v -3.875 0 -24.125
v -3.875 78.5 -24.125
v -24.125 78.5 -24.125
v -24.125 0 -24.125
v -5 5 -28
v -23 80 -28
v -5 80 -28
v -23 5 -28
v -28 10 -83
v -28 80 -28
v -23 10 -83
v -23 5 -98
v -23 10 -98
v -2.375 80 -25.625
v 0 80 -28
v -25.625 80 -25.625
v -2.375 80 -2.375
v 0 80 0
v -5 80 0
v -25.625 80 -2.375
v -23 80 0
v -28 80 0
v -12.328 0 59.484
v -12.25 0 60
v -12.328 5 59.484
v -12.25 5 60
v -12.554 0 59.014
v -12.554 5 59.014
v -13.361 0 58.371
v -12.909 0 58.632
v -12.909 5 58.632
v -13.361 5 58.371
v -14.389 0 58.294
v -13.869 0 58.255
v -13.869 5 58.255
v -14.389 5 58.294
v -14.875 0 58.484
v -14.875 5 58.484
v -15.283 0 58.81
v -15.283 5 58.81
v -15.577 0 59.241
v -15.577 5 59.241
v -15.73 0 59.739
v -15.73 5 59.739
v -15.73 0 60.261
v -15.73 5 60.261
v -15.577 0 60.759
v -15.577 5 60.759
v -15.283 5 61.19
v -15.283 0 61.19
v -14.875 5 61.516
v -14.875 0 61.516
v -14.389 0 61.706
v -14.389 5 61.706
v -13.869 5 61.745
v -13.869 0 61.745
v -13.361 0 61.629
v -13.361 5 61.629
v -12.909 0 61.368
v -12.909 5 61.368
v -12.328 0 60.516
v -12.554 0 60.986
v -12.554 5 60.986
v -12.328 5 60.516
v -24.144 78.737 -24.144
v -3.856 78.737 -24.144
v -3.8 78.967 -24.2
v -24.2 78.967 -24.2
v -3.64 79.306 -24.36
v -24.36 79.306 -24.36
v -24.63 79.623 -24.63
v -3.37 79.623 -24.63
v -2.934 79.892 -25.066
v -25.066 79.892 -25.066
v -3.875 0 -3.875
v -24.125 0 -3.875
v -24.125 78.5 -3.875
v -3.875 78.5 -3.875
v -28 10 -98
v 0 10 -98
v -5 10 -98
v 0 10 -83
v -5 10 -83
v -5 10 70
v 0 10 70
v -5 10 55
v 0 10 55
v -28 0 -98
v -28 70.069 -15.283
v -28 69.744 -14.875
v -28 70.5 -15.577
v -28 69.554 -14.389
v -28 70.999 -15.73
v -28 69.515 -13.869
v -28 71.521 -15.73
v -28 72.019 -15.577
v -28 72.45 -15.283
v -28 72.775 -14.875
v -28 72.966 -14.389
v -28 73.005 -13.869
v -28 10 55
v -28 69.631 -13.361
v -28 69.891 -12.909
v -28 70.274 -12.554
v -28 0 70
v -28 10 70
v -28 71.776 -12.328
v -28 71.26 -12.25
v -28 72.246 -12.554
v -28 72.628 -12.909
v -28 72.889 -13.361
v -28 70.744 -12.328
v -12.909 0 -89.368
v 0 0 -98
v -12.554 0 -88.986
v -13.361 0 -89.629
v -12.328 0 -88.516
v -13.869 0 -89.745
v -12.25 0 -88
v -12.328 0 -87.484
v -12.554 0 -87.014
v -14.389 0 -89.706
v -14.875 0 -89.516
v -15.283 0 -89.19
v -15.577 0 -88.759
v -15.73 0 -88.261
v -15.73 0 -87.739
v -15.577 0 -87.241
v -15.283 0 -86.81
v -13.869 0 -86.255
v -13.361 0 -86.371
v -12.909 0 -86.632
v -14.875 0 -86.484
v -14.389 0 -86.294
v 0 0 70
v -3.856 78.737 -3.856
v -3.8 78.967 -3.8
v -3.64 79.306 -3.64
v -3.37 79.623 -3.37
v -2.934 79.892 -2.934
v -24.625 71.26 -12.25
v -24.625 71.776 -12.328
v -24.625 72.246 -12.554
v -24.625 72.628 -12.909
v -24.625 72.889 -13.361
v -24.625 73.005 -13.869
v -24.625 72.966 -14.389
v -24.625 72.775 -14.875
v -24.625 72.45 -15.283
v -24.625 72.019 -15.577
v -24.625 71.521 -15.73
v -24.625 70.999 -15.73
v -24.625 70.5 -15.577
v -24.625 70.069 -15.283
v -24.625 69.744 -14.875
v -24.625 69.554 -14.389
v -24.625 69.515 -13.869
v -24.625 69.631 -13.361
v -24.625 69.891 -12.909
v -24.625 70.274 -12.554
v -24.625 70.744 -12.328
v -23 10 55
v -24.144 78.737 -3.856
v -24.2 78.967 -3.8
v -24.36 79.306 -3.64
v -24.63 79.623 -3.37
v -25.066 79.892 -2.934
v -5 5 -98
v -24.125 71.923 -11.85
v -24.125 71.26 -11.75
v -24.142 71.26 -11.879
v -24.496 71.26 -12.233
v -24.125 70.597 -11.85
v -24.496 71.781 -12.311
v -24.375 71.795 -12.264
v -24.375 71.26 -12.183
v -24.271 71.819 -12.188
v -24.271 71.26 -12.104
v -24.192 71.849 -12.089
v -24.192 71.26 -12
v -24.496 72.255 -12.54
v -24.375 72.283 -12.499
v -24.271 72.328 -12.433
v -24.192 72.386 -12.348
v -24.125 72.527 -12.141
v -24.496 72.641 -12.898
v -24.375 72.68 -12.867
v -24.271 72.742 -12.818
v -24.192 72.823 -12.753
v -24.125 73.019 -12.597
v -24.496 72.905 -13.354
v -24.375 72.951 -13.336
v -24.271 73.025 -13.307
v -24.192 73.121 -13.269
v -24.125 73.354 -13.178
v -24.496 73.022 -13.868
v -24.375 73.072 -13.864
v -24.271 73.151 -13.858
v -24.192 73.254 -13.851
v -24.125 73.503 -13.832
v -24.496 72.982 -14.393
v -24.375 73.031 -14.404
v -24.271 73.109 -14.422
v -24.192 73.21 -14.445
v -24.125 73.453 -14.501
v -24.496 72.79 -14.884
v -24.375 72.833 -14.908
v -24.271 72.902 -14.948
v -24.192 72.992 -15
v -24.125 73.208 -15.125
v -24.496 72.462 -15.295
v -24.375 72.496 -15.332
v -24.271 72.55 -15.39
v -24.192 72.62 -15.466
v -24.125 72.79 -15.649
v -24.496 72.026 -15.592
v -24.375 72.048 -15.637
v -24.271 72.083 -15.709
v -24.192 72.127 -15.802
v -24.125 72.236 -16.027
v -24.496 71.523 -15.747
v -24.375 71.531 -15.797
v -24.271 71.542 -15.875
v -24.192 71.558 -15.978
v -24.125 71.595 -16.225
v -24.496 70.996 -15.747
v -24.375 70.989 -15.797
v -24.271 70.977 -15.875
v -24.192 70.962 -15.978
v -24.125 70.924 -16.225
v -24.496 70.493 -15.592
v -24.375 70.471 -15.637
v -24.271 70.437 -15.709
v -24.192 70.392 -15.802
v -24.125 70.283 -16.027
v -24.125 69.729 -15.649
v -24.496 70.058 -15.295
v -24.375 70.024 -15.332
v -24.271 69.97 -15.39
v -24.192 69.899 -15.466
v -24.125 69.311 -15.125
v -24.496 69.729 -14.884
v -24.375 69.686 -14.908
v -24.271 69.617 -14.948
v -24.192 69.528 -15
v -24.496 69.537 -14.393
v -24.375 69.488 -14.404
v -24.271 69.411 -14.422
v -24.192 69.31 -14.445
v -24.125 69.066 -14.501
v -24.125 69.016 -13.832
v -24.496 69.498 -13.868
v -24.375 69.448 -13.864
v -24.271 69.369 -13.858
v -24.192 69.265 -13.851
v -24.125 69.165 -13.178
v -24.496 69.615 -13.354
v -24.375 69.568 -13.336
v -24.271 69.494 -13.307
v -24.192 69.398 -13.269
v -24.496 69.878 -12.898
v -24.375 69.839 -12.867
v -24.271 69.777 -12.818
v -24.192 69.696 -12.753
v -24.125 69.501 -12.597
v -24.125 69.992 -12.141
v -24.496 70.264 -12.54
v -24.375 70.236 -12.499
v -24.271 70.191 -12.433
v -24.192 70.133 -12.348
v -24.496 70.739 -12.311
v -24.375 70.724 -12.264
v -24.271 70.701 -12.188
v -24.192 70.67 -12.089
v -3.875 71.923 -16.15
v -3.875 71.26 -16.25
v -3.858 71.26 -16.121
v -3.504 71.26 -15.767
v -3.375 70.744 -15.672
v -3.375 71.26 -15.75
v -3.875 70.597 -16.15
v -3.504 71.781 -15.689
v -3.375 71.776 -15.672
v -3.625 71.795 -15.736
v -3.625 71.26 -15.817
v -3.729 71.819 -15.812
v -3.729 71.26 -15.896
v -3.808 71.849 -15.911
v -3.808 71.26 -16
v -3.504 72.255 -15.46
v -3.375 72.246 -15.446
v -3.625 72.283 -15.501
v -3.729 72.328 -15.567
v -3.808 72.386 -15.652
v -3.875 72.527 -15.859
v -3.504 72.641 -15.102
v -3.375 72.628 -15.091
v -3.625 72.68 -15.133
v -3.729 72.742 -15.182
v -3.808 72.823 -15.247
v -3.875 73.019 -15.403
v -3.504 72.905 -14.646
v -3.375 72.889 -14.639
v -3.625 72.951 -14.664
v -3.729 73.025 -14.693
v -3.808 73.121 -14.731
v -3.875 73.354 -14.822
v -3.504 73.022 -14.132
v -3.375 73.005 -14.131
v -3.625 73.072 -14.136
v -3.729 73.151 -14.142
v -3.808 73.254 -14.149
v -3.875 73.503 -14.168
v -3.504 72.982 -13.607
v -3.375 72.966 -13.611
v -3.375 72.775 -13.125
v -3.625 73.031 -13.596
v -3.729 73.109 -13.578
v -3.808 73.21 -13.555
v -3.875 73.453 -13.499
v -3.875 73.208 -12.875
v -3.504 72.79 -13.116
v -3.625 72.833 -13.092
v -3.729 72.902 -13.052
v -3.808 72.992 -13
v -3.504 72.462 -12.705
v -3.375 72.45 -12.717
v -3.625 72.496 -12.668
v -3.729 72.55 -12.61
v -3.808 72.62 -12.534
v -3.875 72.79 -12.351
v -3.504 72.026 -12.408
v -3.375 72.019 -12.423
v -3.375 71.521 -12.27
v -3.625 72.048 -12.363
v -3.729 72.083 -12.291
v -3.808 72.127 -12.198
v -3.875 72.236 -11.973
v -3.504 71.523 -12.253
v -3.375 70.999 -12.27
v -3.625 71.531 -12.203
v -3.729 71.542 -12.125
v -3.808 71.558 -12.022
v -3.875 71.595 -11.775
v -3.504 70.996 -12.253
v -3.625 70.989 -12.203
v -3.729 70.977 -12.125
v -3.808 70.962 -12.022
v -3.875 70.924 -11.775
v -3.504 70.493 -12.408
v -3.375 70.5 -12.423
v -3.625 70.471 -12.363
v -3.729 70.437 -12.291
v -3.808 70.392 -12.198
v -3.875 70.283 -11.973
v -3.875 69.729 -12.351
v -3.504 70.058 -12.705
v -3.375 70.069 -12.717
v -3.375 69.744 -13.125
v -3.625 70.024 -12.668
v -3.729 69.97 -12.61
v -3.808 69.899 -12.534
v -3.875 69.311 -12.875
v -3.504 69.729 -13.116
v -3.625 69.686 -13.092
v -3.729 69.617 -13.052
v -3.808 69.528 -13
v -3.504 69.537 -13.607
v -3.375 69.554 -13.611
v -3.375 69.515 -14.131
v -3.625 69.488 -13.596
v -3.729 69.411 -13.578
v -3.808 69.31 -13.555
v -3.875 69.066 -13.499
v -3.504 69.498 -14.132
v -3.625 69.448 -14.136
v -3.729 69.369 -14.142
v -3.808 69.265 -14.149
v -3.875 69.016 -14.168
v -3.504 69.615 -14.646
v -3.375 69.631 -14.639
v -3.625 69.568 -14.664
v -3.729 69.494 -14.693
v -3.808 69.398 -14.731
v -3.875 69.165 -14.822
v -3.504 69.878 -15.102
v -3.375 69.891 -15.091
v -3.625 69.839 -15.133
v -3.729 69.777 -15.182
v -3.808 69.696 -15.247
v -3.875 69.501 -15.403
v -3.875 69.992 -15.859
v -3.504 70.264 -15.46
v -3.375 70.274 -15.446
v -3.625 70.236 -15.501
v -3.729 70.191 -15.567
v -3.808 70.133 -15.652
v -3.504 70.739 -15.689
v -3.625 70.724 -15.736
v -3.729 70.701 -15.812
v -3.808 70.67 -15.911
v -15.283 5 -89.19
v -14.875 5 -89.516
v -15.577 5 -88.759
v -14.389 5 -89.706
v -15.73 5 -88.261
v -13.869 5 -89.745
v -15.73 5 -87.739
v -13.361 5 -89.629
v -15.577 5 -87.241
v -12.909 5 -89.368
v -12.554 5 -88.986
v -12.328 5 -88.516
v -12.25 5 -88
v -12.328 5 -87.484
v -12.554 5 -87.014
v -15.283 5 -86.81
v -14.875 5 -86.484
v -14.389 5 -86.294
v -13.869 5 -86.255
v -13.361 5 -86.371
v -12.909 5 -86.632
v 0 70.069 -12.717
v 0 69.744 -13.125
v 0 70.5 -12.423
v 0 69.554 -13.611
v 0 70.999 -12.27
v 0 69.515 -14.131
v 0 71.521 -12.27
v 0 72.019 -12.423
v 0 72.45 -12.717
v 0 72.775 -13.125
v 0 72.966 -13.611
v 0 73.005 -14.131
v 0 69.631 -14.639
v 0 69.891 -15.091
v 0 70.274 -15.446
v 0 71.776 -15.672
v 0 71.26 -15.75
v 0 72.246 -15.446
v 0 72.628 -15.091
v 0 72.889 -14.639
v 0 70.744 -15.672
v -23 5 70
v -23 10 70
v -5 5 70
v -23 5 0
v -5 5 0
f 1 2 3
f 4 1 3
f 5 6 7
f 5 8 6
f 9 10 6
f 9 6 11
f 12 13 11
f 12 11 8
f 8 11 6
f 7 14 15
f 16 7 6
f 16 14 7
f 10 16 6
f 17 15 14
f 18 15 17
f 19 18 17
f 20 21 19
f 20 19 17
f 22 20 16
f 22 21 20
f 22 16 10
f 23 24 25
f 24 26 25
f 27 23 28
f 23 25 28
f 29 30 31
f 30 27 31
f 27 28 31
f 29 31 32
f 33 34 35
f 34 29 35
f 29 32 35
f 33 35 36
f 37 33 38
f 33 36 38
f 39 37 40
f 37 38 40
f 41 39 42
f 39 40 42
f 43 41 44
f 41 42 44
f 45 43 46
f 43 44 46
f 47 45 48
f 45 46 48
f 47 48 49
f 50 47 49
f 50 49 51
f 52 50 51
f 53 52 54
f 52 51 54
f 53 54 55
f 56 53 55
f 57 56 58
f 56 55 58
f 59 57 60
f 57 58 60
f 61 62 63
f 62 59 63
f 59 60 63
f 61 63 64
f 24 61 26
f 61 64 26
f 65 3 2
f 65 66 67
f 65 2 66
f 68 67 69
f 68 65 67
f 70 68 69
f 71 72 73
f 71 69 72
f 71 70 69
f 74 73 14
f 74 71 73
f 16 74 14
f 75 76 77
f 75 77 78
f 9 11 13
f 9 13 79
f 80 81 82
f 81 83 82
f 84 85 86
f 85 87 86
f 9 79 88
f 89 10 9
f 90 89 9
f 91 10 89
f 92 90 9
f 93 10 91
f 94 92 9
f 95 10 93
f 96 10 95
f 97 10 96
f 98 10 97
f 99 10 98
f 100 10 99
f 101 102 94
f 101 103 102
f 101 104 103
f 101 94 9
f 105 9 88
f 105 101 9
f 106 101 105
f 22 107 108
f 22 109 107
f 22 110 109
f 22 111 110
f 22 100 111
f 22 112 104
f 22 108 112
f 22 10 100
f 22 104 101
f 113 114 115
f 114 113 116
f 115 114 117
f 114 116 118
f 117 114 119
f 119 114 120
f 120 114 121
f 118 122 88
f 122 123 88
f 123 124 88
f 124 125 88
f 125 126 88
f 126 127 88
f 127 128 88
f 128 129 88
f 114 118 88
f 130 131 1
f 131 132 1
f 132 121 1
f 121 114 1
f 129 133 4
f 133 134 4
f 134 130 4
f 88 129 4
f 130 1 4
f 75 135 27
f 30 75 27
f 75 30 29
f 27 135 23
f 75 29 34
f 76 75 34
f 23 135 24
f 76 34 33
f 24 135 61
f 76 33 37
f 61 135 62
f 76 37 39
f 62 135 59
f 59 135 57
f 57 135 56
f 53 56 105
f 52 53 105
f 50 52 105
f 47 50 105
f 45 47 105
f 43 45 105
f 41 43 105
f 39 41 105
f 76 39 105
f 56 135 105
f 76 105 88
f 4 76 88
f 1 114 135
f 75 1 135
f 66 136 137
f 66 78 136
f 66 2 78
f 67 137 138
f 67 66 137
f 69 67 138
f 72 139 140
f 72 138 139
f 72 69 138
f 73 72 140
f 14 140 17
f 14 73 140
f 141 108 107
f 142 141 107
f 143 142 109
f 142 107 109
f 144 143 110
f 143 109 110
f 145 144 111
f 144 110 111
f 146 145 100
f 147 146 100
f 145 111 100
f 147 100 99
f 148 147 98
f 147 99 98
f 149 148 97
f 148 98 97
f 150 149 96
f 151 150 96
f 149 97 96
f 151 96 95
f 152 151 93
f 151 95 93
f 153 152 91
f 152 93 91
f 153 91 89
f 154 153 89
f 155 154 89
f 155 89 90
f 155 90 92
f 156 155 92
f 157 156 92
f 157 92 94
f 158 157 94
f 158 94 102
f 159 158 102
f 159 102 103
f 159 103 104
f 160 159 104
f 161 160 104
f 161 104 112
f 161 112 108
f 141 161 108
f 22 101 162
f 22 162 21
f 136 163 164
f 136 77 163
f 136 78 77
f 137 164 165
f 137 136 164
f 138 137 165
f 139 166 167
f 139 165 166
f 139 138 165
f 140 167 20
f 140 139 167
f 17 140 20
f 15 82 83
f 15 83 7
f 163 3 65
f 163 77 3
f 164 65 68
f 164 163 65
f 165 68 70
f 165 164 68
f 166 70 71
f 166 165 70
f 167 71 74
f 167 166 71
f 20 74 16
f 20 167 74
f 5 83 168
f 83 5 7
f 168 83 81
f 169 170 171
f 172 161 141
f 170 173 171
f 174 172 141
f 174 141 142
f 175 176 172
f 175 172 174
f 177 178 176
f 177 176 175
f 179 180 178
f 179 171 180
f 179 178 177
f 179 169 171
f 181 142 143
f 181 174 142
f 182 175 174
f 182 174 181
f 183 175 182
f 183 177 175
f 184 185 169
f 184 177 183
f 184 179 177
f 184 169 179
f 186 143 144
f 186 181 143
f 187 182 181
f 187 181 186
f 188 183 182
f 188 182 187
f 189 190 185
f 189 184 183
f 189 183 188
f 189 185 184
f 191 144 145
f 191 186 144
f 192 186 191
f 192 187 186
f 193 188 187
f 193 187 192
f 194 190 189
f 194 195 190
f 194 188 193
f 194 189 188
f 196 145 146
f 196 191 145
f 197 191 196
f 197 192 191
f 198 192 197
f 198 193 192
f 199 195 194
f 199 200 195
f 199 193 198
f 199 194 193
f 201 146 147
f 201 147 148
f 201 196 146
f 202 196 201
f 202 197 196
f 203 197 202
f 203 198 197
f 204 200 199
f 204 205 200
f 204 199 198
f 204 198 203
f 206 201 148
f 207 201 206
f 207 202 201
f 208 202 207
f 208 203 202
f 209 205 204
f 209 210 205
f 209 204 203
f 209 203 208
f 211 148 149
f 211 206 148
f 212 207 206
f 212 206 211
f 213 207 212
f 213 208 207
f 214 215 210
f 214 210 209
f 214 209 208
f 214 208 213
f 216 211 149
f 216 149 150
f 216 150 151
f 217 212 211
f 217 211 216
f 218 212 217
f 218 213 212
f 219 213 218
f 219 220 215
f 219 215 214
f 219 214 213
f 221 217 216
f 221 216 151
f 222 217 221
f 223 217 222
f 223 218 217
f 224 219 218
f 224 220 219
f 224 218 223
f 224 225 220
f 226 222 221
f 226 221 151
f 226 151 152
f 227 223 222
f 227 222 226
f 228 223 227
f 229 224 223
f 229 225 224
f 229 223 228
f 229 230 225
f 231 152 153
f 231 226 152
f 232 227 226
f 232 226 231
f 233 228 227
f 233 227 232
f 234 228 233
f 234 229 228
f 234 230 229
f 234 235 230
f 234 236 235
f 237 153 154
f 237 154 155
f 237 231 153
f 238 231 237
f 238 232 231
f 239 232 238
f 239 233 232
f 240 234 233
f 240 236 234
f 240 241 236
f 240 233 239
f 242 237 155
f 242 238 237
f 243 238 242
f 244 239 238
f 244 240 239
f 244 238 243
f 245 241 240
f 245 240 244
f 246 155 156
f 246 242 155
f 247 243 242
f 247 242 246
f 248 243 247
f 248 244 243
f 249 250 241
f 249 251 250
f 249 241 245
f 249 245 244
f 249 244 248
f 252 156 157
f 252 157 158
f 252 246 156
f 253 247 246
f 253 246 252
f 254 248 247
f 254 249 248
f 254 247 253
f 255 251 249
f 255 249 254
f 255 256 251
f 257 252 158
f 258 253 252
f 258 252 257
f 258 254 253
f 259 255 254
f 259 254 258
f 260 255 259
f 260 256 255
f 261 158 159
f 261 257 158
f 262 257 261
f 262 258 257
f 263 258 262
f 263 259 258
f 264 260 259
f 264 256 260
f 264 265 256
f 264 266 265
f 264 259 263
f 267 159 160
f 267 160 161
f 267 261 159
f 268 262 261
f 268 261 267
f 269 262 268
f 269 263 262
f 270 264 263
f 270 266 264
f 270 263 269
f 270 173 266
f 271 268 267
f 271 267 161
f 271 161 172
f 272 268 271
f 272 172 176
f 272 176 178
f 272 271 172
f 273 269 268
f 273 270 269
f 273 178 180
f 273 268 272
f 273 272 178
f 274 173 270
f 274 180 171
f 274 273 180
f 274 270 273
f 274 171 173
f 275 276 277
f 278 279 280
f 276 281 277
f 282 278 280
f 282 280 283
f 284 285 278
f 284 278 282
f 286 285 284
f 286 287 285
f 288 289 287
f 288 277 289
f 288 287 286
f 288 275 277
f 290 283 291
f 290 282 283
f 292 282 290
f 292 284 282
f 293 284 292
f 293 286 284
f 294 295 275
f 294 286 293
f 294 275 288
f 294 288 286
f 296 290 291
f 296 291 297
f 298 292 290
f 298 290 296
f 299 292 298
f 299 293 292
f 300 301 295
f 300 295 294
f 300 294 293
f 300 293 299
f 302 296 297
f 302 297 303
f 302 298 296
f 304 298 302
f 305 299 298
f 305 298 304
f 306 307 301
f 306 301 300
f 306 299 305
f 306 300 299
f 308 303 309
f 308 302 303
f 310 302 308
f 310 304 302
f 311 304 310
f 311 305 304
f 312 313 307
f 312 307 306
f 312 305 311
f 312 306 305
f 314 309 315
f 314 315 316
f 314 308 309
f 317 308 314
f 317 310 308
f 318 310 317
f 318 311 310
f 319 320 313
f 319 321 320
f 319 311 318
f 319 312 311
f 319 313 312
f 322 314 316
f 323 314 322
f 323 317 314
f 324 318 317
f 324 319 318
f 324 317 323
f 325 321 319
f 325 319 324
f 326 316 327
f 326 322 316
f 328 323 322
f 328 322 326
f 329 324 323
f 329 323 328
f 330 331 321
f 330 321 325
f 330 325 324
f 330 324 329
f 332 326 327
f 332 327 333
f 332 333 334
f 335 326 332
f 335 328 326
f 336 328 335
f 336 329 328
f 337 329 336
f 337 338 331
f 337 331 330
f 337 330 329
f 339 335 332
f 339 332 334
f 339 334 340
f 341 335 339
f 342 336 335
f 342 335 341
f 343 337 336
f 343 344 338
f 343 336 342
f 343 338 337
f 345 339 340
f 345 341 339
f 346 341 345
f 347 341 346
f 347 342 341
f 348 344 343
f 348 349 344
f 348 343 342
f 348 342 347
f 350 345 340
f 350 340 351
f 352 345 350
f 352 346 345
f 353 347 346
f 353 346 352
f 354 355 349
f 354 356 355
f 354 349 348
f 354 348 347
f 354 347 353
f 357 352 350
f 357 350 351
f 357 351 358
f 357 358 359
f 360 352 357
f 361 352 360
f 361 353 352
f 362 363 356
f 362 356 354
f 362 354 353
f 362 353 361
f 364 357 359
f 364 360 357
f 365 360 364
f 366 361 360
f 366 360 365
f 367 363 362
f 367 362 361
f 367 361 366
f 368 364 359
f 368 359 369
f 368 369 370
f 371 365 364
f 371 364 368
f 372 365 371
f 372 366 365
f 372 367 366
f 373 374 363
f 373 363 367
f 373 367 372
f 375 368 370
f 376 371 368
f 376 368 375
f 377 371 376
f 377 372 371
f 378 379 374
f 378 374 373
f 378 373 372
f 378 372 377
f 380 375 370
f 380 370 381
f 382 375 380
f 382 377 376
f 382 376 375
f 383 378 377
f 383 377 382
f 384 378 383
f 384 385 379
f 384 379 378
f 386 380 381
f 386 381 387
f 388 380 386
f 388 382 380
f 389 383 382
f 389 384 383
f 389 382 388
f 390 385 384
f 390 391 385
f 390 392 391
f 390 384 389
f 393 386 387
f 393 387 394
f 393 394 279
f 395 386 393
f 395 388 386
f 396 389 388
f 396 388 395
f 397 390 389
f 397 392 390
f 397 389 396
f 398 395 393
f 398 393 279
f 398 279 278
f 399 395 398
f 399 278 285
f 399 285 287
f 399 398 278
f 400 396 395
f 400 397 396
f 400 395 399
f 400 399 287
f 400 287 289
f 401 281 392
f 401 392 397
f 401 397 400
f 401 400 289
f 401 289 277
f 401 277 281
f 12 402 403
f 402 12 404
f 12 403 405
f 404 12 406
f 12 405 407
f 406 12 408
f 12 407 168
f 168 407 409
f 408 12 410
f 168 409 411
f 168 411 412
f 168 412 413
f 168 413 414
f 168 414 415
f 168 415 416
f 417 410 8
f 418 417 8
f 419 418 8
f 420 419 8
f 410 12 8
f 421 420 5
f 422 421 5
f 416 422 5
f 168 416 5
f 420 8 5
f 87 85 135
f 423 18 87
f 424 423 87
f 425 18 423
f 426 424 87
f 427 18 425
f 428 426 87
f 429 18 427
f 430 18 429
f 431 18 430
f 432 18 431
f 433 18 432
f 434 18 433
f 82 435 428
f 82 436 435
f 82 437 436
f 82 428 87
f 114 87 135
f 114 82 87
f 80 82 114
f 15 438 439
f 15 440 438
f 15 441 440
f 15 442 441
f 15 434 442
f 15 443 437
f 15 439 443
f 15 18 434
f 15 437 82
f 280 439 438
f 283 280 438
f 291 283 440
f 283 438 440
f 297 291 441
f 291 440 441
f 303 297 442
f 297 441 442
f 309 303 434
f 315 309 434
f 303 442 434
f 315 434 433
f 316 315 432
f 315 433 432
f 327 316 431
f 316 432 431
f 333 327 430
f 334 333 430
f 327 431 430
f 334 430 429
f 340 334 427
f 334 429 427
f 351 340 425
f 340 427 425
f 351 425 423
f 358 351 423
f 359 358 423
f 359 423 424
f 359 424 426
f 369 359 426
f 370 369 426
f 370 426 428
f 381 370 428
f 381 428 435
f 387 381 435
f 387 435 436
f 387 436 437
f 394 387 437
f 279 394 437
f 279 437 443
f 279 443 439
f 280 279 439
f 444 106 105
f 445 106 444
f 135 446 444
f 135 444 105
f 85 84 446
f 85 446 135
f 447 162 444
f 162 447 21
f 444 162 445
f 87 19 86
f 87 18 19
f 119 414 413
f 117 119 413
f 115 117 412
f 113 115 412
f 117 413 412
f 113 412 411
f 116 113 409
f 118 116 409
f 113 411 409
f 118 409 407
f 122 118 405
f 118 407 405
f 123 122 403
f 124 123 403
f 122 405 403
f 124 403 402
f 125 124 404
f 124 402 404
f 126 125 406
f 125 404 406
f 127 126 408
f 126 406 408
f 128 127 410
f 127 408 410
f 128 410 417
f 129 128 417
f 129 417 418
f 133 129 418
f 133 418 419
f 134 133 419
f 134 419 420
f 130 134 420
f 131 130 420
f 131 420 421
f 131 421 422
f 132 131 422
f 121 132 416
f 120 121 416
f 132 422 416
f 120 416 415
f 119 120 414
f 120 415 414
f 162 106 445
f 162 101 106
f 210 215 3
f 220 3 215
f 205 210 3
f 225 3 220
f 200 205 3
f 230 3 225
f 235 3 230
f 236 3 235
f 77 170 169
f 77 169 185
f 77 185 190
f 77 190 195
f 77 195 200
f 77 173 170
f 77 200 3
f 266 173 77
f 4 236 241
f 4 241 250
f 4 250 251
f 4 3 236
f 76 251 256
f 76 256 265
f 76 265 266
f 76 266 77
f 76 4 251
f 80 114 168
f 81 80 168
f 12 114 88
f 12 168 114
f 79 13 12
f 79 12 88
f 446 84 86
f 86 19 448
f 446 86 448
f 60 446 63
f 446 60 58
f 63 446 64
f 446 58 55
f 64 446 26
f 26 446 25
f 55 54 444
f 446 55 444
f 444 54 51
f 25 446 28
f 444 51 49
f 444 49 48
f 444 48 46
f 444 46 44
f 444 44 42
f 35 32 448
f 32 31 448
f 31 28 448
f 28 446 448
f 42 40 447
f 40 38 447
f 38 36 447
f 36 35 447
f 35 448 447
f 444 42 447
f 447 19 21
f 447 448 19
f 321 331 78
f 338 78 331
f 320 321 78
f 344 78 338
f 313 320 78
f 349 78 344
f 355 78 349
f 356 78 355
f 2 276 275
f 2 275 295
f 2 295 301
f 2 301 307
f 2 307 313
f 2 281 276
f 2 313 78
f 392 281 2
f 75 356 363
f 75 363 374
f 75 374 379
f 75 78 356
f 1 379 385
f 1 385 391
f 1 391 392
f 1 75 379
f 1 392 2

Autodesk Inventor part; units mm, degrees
ref_plane "YZ Plane" through (0, 0, 0) normal (1, 0, 0) x (0, 1, 0)
ref_plane "XZ Plane" through (0, 0, 0) normal (0, 1, 0) x (-1, 0, 0)
sketch "Sketch1" plane through (0, 0, 0) normal (0, 1, 0) x (-1, 0, 0)
  line L0 (0, 0) -> (28, 0)
  line L1 (28, 0) -> (28, -28)
  line L2 (28, -28) -> (0, -28)
  line L3 (0, -28) -> (0, 0)
  line L4 (24.125, -3.875) -> (3.875, -3.875)
  line L5 (3.875, -3.875) -> (3.875, -24.125)
  line L6 (3.875, -24.125) -> (24.125, -24.125)
  line L7 (24.125, -24.125) -> (24.125, -3.875)
  line L8 (24.125, -3.875) -> (3.875, -24.125) construction
  line L9 (3.875, -3.875) -> (24.125, -24.125) construction
  line L10 (0, 0) -> (28, -28) construction
  line L11 (28, 0) -> (0, -28) construction
  point P0 (14, -14)
  dimension "externo" = 28
  dimension "externo2" = 28
  dimension "interno" = 20.25
  dimension "interno2" = 20.25
extrude "principal" add sketch "Sketch1" along normal blind 80
sketch "Sketch2" plane through (-28, 80, -28) normal (-1, 0, 0) x (0, 0, 1)
  circle A0 centre (14, -8.7403) radius 1.75
  point P0 (28, -80)
  dimension "hueco_tornillo" = 3.5
extrude "hueco1" cut sketch "Sketch2" against normal blind 7.75
sketch "Sketch3" plane through (0, 80, 0) normal (1, 0, 0) x (0, 0, -1)
  circle A0 centre (14, -8.7403) radius 1.75 projected
  circle A1 centre (14, -8.7403) radius 1.75
  point P0 (0, -80)
  dimension "hueco_tornillo_2" = 3.5
extrude "hueco2" cut sketch "Sketch3" against normal blind 7.75
fillet "hueco_Fillet" radius 0.5 2 edges at (-3.875, 71.2597, -12.25) (-24.125, 71.2597, -15.75)
sketch "Sketch4" plane through (0, 0, -28) normal (0, 0, -1) x (-1, 0, 0)
  line L0 (28, 0) -> (0, 0) projected
  line L1 (0, 0) -> (28, 0)
  line L2 (28, 0) -> (28, 5)
  line L3 (28, 5) -> (0, 5)
  line L4 (0, 5) -> (0, 0)
  line L5 (0, 5) -> (5, 5)
  line L6 (5, 5) -> (5, 10)
  line L7 (5, 10) -> (0, 10)
  line L8 (0, 10) -> (0, 5)
  line L9 (28, 5) -> (23, 5)
  line L10 (23, 5) -> (23, 10)
  line L11 (23, 10) -> (28, 10)
  line L12 (28, 10) -> (28, 5)
  point P0 (23, 5)
  point P1 (5, 5)
  dimension "lateral_ancho" = 28
  dimension "lateral_espesor" = 5
  dimension "lateral_refuerzo_1_ancho" = 5
  dimension "lateral_refuerzo_1_alto" = 5
  dimension "lateral_refuerzo_2_ancho" = 5
  dimension "lateral_refuerzo_2_alto" = 5
extrude "lateral" add sketch "Sketch4" along normal blind 70
sketch "Sketch5" plane through (0, 0, 0) normal (1, 0, 0) x (0, 0, -1)
  line L0 (0, 80) -> (28, 80) projected
  line L1 (28, 10) -> (28, 80) projected
  line L2 (28, 80) -> (28, 10)
  line L3 (28, 10) -> (83, 10)
  line L4 (83, 10) -> (28, 80)
  point P0 (0, 0)
  dimension "refuerzo" = 55
extrude "escuadra" add sketch "Sketch5" against normal blind 5
ref_plane "Work Plane1" through (-14, 0, 0) normal (1, 0, 0) x (0, 0, -1)
mirror "escuadra_Mirror" about plane through (-14, 0, 0) normal (1, 0, 0) of "escuadra"
sketch "Sketch6" plane through (-23, 5, -28) normal (0, 1, 0) x (1, 0, 0)
  circle A0 centre (9, 60) radius 1.75
  line L0 (0, 70) -> (18, 70) projected
  point P0 (23, -28)
  dimension "hueco_tornillo_lateral" = 3.5
  dimension "hueco_lateral_sep" = 10
extrude "hueco_lateral" cut sketch "Sketch6" against normal blind 5
ref_plane "Work Plane2" through (-5, 5, -14) normal (0, 0, -1) x (-1, 0, 0)
mirror "lateral_mirror" about plane through (-5, 5, -14) normal (0, 0, -1) of "escuadra", "escuadra_Mirror", "lateral", "hueco_lateral"
fillet "entrada_Fillet" radius 1.5 4 edges at (-24.125, 80, -14) (-14, 80, -3.875) (-3.875, 80, -14) (-14, 80, -24.125)
equation "\"externo2\" = externo"
equation "\"interno2\" = interno"
equation "\"hueco_profundidad\" = externo - interno"
equation "\"hueco_tornillo_2\" = hueco_tornillo"
equation "\"hueco_profundidad_2\" = hueco_profundidad"
equation "\"lateral_ancho\" = externo"
equation "\"lateral_refuerzo_1_ancho\" = lateral_espesor"
equation "\"lateral_refuerzo_1_alto\" = lateral_espesor"
equation "\"lateral_refuerzo_2_ancho\" = lateral_espesor"
equation "\"lateral_refuerzo_2_alto\" = lateral_espesor"
equation "\"d23\" = lateral_espesor"
equation "\"hueco_tornillo_lateral\" = hueco_tornillo"
equation "\"d27\" = lateral_espesor"
properties part number "SoportePrincipal"
